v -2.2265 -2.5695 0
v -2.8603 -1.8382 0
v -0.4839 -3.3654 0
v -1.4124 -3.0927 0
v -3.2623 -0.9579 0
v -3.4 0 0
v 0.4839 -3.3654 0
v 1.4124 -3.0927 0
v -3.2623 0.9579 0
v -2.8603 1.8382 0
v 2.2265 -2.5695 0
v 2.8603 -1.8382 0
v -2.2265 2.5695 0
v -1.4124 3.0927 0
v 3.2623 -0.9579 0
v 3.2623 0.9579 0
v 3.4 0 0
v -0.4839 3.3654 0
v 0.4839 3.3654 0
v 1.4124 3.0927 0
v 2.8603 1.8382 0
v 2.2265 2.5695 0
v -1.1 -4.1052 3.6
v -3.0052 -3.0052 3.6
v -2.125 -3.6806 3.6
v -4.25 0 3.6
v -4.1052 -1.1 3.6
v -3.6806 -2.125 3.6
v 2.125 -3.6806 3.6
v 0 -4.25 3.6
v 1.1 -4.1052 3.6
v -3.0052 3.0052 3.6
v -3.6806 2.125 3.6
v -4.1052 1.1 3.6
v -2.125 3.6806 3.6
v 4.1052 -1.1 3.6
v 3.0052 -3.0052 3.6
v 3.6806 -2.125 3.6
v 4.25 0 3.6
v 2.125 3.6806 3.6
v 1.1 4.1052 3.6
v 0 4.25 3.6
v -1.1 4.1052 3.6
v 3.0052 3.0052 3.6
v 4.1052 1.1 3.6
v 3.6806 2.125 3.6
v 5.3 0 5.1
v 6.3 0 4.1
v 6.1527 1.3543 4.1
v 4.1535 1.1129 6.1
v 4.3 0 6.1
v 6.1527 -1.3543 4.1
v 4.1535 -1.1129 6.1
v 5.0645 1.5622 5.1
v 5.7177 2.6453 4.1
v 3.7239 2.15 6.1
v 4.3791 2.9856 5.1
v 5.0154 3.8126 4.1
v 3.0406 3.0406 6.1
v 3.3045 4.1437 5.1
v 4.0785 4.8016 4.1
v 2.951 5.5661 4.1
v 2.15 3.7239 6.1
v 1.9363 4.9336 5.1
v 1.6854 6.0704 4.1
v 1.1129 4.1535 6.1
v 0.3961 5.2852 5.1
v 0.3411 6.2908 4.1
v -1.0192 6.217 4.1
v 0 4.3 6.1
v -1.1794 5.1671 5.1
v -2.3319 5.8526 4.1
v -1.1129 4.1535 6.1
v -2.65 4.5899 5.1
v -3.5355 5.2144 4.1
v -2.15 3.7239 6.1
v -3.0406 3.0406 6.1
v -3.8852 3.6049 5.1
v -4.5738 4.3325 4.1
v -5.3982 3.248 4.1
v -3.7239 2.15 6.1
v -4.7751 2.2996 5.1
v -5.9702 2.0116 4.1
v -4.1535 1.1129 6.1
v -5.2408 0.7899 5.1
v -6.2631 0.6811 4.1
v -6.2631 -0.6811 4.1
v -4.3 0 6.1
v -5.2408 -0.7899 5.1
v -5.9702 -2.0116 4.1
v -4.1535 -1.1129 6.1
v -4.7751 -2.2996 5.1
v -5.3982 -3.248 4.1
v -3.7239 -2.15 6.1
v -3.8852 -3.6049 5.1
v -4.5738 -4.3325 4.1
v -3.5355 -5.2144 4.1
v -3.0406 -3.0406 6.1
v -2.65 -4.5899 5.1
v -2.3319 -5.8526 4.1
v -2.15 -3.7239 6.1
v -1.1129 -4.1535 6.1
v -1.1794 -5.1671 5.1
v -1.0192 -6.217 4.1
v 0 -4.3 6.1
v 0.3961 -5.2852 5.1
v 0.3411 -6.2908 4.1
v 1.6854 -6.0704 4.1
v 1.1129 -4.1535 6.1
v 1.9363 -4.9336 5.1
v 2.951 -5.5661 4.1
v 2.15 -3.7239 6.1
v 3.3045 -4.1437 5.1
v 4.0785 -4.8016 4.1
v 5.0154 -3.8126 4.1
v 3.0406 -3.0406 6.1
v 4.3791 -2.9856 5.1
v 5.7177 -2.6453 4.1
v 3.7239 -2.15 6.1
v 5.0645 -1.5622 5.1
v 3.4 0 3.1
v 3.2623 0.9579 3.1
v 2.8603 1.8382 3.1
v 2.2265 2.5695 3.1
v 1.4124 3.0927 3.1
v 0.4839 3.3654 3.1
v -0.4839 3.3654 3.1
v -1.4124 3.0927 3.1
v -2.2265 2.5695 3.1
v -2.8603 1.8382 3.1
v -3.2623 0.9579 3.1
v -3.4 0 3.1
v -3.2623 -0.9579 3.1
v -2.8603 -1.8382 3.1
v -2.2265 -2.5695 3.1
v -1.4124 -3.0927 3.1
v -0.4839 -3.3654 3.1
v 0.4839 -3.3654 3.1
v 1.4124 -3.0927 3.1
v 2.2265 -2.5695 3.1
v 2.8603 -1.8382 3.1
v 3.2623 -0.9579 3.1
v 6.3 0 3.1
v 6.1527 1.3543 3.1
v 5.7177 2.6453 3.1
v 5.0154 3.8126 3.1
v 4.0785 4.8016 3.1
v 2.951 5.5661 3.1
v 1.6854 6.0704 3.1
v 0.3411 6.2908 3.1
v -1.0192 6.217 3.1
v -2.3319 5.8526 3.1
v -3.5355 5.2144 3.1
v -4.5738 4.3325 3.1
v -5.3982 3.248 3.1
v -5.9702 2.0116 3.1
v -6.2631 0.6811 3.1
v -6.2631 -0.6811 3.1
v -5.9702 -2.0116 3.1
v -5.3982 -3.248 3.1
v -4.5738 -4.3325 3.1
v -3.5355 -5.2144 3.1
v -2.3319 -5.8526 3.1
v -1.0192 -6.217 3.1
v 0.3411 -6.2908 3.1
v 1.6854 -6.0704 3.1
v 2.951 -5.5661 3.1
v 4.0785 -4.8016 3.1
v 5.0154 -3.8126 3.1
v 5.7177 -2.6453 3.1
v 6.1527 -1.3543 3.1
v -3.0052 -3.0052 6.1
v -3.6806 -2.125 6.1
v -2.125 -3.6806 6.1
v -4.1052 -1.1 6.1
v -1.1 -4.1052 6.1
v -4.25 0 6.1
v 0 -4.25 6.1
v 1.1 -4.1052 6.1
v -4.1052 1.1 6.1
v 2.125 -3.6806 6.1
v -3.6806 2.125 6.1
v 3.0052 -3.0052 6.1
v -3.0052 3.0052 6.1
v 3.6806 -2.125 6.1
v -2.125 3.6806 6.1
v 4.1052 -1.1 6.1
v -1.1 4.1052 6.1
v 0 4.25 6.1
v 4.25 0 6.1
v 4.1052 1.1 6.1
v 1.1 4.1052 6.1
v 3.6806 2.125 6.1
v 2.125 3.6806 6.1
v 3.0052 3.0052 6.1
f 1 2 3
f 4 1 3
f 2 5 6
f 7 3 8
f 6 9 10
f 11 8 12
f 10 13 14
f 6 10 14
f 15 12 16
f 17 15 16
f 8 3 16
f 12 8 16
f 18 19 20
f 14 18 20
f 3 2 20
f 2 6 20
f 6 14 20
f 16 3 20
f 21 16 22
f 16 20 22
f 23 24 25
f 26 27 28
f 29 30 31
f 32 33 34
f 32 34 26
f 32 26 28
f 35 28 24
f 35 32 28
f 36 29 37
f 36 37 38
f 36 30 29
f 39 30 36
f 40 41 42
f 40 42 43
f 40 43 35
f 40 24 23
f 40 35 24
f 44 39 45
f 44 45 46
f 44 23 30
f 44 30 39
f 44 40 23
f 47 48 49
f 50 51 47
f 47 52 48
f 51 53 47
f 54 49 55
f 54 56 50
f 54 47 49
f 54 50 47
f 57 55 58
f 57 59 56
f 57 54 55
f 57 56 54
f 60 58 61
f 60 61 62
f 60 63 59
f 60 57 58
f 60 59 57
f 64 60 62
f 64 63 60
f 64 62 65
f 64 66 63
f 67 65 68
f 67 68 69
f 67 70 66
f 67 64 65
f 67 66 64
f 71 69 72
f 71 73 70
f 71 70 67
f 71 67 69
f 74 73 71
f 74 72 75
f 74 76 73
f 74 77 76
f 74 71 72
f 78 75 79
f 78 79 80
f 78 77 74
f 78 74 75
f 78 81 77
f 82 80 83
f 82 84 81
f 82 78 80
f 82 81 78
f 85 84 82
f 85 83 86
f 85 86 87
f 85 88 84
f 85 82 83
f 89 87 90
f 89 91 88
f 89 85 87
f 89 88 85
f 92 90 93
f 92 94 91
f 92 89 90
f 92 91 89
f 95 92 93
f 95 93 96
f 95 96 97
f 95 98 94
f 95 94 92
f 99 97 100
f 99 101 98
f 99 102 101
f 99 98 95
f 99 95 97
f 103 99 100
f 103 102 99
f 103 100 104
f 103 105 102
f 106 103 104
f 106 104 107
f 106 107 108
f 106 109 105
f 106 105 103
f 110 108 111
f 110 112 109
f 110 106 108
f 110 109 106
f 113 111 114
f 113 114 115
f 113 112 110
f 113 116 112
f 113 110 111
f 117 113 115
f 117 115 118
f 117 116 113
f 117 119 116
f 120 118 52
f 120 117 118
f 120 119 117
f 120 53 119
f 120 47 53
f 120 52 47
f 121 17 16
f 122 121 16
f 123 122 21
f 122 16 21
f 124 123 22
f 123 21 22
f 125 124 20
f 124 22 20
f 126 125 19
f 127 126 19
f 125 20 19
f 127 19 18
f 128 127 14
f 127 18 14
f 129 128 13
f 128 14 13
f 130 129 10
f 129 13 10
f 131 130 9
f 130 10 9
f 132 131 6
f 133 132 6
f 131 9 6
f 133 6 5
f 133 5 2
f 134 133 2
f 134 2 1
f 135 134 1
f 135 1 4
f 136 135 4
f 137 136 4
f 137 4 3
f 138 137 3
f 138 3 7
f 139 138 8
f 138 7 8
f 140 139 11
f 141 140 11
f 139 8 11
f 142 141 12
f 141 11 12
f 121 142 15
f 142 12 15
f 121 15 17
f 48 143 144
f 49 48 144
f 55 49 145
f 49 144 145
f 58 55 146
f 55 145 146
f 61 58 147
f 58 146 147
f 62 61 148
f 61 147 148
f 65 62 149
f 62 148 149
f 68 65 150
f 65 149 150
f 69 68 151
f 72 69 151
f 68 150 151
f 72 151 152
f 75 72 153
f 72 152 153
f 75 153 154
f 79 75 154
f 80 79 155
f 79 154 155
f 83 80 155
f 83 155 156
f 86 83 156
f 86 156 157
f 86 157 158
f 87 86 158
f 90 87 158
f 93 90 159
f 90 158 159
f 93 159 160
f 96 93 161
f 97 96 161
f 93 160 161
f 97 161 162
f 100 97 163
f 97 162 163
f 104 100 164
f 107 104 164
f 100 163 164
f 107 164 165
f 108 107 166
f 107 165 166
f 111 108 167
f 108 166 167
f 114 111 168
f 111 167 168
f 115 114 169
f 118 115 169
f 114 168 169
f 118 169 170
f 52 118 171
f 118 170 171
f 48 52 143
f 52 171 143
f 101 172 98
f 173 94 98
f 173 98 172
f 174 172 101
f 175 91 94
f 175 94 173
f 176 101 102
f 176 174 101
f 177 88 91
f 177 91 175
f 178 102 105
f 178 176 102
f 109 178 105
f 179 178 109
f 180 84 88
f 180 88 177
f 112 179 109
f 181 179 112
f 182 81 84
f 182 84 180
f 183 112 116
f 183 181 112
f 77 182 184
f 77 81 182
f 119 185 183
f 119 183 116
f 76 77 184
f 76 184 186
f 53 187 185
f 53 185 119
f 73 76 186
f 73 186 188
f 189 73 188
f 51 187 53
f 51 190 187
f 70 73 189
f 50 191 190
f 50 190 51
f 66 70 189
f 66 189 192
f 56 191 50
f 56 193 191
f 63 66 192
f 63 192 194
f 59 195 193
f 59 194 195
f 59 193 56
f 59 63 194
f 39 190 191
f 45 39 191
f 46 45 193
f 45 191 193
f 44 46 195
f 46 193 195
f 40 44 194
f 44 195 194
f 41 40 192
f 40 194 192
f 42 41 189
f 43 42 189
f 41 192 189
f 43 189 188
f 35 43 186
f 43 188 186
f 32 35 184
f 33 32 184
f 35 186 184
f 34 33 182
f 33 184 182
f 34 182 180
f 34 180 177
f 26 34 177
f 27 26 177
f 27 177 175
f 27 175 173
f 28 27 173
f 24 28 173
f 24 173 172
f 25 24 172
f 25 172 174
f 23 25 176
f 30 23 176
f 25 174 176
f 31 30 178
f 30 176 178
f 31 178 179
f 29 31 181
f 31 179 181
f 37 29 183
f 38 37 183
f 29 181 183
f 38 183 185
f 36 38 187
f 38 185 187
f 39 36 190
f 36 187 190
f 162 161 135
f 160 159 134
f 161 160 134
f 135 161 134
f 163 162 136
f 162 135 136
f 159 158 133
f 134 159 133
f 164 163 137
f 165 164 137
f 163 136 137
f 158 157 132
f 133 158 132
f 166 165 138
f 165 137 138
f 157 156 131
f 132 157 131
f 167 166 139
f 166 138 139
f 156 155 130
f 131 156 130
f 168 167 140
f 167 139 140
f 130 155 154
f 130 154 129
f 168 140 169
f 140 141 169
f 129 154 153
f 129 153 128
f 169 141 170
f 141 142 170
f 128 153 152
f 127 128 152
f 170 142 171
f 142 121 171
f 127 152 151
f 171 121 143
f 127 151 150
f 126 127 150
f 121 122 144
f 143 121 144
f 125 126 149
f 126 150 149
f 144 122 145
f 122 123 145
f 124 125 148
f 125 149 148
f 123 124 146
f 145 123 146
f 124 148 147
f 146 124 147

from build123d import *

# Parameters (mm, degrees)
F0_R     = 3.4
F1_DEPTH = 3.1
F2_R     = 6.3
F3_DEPTH = 3
F4_SIZE  = 2
F5_R     = 4.25
F6_DEPTH = 2.5


with BuildPart() as f1:
    # F0 (on Top) → F1 (new body)
    with BuildSketch(Plane.XY):
        Circle(F0_R)
    extrude(amount=F1_DEPTH)

    # F2 (on face) → F3 (join)
    with BuildSketch(Plane.XY.offset(3.1)):
        Circle(F2_R)
    extrude(amount=F3_DEPTH)

    # F4
    f4_edges = [f1.edges().sort_by_distance(p)[0] for p in [
        (-6.3, 0, 6.1),
    ]]
    chamfer(f4_edges, length=F4_SIZE)

    # F5 (on face) → F6 (cut)
    with BuildSketch(Plane.XY.offset(6.1)):
        Circle(F5_R)
    extrude(amount=-F6_DEPTH, mode=Mode.SUBTRACT)


solid = f1.part
